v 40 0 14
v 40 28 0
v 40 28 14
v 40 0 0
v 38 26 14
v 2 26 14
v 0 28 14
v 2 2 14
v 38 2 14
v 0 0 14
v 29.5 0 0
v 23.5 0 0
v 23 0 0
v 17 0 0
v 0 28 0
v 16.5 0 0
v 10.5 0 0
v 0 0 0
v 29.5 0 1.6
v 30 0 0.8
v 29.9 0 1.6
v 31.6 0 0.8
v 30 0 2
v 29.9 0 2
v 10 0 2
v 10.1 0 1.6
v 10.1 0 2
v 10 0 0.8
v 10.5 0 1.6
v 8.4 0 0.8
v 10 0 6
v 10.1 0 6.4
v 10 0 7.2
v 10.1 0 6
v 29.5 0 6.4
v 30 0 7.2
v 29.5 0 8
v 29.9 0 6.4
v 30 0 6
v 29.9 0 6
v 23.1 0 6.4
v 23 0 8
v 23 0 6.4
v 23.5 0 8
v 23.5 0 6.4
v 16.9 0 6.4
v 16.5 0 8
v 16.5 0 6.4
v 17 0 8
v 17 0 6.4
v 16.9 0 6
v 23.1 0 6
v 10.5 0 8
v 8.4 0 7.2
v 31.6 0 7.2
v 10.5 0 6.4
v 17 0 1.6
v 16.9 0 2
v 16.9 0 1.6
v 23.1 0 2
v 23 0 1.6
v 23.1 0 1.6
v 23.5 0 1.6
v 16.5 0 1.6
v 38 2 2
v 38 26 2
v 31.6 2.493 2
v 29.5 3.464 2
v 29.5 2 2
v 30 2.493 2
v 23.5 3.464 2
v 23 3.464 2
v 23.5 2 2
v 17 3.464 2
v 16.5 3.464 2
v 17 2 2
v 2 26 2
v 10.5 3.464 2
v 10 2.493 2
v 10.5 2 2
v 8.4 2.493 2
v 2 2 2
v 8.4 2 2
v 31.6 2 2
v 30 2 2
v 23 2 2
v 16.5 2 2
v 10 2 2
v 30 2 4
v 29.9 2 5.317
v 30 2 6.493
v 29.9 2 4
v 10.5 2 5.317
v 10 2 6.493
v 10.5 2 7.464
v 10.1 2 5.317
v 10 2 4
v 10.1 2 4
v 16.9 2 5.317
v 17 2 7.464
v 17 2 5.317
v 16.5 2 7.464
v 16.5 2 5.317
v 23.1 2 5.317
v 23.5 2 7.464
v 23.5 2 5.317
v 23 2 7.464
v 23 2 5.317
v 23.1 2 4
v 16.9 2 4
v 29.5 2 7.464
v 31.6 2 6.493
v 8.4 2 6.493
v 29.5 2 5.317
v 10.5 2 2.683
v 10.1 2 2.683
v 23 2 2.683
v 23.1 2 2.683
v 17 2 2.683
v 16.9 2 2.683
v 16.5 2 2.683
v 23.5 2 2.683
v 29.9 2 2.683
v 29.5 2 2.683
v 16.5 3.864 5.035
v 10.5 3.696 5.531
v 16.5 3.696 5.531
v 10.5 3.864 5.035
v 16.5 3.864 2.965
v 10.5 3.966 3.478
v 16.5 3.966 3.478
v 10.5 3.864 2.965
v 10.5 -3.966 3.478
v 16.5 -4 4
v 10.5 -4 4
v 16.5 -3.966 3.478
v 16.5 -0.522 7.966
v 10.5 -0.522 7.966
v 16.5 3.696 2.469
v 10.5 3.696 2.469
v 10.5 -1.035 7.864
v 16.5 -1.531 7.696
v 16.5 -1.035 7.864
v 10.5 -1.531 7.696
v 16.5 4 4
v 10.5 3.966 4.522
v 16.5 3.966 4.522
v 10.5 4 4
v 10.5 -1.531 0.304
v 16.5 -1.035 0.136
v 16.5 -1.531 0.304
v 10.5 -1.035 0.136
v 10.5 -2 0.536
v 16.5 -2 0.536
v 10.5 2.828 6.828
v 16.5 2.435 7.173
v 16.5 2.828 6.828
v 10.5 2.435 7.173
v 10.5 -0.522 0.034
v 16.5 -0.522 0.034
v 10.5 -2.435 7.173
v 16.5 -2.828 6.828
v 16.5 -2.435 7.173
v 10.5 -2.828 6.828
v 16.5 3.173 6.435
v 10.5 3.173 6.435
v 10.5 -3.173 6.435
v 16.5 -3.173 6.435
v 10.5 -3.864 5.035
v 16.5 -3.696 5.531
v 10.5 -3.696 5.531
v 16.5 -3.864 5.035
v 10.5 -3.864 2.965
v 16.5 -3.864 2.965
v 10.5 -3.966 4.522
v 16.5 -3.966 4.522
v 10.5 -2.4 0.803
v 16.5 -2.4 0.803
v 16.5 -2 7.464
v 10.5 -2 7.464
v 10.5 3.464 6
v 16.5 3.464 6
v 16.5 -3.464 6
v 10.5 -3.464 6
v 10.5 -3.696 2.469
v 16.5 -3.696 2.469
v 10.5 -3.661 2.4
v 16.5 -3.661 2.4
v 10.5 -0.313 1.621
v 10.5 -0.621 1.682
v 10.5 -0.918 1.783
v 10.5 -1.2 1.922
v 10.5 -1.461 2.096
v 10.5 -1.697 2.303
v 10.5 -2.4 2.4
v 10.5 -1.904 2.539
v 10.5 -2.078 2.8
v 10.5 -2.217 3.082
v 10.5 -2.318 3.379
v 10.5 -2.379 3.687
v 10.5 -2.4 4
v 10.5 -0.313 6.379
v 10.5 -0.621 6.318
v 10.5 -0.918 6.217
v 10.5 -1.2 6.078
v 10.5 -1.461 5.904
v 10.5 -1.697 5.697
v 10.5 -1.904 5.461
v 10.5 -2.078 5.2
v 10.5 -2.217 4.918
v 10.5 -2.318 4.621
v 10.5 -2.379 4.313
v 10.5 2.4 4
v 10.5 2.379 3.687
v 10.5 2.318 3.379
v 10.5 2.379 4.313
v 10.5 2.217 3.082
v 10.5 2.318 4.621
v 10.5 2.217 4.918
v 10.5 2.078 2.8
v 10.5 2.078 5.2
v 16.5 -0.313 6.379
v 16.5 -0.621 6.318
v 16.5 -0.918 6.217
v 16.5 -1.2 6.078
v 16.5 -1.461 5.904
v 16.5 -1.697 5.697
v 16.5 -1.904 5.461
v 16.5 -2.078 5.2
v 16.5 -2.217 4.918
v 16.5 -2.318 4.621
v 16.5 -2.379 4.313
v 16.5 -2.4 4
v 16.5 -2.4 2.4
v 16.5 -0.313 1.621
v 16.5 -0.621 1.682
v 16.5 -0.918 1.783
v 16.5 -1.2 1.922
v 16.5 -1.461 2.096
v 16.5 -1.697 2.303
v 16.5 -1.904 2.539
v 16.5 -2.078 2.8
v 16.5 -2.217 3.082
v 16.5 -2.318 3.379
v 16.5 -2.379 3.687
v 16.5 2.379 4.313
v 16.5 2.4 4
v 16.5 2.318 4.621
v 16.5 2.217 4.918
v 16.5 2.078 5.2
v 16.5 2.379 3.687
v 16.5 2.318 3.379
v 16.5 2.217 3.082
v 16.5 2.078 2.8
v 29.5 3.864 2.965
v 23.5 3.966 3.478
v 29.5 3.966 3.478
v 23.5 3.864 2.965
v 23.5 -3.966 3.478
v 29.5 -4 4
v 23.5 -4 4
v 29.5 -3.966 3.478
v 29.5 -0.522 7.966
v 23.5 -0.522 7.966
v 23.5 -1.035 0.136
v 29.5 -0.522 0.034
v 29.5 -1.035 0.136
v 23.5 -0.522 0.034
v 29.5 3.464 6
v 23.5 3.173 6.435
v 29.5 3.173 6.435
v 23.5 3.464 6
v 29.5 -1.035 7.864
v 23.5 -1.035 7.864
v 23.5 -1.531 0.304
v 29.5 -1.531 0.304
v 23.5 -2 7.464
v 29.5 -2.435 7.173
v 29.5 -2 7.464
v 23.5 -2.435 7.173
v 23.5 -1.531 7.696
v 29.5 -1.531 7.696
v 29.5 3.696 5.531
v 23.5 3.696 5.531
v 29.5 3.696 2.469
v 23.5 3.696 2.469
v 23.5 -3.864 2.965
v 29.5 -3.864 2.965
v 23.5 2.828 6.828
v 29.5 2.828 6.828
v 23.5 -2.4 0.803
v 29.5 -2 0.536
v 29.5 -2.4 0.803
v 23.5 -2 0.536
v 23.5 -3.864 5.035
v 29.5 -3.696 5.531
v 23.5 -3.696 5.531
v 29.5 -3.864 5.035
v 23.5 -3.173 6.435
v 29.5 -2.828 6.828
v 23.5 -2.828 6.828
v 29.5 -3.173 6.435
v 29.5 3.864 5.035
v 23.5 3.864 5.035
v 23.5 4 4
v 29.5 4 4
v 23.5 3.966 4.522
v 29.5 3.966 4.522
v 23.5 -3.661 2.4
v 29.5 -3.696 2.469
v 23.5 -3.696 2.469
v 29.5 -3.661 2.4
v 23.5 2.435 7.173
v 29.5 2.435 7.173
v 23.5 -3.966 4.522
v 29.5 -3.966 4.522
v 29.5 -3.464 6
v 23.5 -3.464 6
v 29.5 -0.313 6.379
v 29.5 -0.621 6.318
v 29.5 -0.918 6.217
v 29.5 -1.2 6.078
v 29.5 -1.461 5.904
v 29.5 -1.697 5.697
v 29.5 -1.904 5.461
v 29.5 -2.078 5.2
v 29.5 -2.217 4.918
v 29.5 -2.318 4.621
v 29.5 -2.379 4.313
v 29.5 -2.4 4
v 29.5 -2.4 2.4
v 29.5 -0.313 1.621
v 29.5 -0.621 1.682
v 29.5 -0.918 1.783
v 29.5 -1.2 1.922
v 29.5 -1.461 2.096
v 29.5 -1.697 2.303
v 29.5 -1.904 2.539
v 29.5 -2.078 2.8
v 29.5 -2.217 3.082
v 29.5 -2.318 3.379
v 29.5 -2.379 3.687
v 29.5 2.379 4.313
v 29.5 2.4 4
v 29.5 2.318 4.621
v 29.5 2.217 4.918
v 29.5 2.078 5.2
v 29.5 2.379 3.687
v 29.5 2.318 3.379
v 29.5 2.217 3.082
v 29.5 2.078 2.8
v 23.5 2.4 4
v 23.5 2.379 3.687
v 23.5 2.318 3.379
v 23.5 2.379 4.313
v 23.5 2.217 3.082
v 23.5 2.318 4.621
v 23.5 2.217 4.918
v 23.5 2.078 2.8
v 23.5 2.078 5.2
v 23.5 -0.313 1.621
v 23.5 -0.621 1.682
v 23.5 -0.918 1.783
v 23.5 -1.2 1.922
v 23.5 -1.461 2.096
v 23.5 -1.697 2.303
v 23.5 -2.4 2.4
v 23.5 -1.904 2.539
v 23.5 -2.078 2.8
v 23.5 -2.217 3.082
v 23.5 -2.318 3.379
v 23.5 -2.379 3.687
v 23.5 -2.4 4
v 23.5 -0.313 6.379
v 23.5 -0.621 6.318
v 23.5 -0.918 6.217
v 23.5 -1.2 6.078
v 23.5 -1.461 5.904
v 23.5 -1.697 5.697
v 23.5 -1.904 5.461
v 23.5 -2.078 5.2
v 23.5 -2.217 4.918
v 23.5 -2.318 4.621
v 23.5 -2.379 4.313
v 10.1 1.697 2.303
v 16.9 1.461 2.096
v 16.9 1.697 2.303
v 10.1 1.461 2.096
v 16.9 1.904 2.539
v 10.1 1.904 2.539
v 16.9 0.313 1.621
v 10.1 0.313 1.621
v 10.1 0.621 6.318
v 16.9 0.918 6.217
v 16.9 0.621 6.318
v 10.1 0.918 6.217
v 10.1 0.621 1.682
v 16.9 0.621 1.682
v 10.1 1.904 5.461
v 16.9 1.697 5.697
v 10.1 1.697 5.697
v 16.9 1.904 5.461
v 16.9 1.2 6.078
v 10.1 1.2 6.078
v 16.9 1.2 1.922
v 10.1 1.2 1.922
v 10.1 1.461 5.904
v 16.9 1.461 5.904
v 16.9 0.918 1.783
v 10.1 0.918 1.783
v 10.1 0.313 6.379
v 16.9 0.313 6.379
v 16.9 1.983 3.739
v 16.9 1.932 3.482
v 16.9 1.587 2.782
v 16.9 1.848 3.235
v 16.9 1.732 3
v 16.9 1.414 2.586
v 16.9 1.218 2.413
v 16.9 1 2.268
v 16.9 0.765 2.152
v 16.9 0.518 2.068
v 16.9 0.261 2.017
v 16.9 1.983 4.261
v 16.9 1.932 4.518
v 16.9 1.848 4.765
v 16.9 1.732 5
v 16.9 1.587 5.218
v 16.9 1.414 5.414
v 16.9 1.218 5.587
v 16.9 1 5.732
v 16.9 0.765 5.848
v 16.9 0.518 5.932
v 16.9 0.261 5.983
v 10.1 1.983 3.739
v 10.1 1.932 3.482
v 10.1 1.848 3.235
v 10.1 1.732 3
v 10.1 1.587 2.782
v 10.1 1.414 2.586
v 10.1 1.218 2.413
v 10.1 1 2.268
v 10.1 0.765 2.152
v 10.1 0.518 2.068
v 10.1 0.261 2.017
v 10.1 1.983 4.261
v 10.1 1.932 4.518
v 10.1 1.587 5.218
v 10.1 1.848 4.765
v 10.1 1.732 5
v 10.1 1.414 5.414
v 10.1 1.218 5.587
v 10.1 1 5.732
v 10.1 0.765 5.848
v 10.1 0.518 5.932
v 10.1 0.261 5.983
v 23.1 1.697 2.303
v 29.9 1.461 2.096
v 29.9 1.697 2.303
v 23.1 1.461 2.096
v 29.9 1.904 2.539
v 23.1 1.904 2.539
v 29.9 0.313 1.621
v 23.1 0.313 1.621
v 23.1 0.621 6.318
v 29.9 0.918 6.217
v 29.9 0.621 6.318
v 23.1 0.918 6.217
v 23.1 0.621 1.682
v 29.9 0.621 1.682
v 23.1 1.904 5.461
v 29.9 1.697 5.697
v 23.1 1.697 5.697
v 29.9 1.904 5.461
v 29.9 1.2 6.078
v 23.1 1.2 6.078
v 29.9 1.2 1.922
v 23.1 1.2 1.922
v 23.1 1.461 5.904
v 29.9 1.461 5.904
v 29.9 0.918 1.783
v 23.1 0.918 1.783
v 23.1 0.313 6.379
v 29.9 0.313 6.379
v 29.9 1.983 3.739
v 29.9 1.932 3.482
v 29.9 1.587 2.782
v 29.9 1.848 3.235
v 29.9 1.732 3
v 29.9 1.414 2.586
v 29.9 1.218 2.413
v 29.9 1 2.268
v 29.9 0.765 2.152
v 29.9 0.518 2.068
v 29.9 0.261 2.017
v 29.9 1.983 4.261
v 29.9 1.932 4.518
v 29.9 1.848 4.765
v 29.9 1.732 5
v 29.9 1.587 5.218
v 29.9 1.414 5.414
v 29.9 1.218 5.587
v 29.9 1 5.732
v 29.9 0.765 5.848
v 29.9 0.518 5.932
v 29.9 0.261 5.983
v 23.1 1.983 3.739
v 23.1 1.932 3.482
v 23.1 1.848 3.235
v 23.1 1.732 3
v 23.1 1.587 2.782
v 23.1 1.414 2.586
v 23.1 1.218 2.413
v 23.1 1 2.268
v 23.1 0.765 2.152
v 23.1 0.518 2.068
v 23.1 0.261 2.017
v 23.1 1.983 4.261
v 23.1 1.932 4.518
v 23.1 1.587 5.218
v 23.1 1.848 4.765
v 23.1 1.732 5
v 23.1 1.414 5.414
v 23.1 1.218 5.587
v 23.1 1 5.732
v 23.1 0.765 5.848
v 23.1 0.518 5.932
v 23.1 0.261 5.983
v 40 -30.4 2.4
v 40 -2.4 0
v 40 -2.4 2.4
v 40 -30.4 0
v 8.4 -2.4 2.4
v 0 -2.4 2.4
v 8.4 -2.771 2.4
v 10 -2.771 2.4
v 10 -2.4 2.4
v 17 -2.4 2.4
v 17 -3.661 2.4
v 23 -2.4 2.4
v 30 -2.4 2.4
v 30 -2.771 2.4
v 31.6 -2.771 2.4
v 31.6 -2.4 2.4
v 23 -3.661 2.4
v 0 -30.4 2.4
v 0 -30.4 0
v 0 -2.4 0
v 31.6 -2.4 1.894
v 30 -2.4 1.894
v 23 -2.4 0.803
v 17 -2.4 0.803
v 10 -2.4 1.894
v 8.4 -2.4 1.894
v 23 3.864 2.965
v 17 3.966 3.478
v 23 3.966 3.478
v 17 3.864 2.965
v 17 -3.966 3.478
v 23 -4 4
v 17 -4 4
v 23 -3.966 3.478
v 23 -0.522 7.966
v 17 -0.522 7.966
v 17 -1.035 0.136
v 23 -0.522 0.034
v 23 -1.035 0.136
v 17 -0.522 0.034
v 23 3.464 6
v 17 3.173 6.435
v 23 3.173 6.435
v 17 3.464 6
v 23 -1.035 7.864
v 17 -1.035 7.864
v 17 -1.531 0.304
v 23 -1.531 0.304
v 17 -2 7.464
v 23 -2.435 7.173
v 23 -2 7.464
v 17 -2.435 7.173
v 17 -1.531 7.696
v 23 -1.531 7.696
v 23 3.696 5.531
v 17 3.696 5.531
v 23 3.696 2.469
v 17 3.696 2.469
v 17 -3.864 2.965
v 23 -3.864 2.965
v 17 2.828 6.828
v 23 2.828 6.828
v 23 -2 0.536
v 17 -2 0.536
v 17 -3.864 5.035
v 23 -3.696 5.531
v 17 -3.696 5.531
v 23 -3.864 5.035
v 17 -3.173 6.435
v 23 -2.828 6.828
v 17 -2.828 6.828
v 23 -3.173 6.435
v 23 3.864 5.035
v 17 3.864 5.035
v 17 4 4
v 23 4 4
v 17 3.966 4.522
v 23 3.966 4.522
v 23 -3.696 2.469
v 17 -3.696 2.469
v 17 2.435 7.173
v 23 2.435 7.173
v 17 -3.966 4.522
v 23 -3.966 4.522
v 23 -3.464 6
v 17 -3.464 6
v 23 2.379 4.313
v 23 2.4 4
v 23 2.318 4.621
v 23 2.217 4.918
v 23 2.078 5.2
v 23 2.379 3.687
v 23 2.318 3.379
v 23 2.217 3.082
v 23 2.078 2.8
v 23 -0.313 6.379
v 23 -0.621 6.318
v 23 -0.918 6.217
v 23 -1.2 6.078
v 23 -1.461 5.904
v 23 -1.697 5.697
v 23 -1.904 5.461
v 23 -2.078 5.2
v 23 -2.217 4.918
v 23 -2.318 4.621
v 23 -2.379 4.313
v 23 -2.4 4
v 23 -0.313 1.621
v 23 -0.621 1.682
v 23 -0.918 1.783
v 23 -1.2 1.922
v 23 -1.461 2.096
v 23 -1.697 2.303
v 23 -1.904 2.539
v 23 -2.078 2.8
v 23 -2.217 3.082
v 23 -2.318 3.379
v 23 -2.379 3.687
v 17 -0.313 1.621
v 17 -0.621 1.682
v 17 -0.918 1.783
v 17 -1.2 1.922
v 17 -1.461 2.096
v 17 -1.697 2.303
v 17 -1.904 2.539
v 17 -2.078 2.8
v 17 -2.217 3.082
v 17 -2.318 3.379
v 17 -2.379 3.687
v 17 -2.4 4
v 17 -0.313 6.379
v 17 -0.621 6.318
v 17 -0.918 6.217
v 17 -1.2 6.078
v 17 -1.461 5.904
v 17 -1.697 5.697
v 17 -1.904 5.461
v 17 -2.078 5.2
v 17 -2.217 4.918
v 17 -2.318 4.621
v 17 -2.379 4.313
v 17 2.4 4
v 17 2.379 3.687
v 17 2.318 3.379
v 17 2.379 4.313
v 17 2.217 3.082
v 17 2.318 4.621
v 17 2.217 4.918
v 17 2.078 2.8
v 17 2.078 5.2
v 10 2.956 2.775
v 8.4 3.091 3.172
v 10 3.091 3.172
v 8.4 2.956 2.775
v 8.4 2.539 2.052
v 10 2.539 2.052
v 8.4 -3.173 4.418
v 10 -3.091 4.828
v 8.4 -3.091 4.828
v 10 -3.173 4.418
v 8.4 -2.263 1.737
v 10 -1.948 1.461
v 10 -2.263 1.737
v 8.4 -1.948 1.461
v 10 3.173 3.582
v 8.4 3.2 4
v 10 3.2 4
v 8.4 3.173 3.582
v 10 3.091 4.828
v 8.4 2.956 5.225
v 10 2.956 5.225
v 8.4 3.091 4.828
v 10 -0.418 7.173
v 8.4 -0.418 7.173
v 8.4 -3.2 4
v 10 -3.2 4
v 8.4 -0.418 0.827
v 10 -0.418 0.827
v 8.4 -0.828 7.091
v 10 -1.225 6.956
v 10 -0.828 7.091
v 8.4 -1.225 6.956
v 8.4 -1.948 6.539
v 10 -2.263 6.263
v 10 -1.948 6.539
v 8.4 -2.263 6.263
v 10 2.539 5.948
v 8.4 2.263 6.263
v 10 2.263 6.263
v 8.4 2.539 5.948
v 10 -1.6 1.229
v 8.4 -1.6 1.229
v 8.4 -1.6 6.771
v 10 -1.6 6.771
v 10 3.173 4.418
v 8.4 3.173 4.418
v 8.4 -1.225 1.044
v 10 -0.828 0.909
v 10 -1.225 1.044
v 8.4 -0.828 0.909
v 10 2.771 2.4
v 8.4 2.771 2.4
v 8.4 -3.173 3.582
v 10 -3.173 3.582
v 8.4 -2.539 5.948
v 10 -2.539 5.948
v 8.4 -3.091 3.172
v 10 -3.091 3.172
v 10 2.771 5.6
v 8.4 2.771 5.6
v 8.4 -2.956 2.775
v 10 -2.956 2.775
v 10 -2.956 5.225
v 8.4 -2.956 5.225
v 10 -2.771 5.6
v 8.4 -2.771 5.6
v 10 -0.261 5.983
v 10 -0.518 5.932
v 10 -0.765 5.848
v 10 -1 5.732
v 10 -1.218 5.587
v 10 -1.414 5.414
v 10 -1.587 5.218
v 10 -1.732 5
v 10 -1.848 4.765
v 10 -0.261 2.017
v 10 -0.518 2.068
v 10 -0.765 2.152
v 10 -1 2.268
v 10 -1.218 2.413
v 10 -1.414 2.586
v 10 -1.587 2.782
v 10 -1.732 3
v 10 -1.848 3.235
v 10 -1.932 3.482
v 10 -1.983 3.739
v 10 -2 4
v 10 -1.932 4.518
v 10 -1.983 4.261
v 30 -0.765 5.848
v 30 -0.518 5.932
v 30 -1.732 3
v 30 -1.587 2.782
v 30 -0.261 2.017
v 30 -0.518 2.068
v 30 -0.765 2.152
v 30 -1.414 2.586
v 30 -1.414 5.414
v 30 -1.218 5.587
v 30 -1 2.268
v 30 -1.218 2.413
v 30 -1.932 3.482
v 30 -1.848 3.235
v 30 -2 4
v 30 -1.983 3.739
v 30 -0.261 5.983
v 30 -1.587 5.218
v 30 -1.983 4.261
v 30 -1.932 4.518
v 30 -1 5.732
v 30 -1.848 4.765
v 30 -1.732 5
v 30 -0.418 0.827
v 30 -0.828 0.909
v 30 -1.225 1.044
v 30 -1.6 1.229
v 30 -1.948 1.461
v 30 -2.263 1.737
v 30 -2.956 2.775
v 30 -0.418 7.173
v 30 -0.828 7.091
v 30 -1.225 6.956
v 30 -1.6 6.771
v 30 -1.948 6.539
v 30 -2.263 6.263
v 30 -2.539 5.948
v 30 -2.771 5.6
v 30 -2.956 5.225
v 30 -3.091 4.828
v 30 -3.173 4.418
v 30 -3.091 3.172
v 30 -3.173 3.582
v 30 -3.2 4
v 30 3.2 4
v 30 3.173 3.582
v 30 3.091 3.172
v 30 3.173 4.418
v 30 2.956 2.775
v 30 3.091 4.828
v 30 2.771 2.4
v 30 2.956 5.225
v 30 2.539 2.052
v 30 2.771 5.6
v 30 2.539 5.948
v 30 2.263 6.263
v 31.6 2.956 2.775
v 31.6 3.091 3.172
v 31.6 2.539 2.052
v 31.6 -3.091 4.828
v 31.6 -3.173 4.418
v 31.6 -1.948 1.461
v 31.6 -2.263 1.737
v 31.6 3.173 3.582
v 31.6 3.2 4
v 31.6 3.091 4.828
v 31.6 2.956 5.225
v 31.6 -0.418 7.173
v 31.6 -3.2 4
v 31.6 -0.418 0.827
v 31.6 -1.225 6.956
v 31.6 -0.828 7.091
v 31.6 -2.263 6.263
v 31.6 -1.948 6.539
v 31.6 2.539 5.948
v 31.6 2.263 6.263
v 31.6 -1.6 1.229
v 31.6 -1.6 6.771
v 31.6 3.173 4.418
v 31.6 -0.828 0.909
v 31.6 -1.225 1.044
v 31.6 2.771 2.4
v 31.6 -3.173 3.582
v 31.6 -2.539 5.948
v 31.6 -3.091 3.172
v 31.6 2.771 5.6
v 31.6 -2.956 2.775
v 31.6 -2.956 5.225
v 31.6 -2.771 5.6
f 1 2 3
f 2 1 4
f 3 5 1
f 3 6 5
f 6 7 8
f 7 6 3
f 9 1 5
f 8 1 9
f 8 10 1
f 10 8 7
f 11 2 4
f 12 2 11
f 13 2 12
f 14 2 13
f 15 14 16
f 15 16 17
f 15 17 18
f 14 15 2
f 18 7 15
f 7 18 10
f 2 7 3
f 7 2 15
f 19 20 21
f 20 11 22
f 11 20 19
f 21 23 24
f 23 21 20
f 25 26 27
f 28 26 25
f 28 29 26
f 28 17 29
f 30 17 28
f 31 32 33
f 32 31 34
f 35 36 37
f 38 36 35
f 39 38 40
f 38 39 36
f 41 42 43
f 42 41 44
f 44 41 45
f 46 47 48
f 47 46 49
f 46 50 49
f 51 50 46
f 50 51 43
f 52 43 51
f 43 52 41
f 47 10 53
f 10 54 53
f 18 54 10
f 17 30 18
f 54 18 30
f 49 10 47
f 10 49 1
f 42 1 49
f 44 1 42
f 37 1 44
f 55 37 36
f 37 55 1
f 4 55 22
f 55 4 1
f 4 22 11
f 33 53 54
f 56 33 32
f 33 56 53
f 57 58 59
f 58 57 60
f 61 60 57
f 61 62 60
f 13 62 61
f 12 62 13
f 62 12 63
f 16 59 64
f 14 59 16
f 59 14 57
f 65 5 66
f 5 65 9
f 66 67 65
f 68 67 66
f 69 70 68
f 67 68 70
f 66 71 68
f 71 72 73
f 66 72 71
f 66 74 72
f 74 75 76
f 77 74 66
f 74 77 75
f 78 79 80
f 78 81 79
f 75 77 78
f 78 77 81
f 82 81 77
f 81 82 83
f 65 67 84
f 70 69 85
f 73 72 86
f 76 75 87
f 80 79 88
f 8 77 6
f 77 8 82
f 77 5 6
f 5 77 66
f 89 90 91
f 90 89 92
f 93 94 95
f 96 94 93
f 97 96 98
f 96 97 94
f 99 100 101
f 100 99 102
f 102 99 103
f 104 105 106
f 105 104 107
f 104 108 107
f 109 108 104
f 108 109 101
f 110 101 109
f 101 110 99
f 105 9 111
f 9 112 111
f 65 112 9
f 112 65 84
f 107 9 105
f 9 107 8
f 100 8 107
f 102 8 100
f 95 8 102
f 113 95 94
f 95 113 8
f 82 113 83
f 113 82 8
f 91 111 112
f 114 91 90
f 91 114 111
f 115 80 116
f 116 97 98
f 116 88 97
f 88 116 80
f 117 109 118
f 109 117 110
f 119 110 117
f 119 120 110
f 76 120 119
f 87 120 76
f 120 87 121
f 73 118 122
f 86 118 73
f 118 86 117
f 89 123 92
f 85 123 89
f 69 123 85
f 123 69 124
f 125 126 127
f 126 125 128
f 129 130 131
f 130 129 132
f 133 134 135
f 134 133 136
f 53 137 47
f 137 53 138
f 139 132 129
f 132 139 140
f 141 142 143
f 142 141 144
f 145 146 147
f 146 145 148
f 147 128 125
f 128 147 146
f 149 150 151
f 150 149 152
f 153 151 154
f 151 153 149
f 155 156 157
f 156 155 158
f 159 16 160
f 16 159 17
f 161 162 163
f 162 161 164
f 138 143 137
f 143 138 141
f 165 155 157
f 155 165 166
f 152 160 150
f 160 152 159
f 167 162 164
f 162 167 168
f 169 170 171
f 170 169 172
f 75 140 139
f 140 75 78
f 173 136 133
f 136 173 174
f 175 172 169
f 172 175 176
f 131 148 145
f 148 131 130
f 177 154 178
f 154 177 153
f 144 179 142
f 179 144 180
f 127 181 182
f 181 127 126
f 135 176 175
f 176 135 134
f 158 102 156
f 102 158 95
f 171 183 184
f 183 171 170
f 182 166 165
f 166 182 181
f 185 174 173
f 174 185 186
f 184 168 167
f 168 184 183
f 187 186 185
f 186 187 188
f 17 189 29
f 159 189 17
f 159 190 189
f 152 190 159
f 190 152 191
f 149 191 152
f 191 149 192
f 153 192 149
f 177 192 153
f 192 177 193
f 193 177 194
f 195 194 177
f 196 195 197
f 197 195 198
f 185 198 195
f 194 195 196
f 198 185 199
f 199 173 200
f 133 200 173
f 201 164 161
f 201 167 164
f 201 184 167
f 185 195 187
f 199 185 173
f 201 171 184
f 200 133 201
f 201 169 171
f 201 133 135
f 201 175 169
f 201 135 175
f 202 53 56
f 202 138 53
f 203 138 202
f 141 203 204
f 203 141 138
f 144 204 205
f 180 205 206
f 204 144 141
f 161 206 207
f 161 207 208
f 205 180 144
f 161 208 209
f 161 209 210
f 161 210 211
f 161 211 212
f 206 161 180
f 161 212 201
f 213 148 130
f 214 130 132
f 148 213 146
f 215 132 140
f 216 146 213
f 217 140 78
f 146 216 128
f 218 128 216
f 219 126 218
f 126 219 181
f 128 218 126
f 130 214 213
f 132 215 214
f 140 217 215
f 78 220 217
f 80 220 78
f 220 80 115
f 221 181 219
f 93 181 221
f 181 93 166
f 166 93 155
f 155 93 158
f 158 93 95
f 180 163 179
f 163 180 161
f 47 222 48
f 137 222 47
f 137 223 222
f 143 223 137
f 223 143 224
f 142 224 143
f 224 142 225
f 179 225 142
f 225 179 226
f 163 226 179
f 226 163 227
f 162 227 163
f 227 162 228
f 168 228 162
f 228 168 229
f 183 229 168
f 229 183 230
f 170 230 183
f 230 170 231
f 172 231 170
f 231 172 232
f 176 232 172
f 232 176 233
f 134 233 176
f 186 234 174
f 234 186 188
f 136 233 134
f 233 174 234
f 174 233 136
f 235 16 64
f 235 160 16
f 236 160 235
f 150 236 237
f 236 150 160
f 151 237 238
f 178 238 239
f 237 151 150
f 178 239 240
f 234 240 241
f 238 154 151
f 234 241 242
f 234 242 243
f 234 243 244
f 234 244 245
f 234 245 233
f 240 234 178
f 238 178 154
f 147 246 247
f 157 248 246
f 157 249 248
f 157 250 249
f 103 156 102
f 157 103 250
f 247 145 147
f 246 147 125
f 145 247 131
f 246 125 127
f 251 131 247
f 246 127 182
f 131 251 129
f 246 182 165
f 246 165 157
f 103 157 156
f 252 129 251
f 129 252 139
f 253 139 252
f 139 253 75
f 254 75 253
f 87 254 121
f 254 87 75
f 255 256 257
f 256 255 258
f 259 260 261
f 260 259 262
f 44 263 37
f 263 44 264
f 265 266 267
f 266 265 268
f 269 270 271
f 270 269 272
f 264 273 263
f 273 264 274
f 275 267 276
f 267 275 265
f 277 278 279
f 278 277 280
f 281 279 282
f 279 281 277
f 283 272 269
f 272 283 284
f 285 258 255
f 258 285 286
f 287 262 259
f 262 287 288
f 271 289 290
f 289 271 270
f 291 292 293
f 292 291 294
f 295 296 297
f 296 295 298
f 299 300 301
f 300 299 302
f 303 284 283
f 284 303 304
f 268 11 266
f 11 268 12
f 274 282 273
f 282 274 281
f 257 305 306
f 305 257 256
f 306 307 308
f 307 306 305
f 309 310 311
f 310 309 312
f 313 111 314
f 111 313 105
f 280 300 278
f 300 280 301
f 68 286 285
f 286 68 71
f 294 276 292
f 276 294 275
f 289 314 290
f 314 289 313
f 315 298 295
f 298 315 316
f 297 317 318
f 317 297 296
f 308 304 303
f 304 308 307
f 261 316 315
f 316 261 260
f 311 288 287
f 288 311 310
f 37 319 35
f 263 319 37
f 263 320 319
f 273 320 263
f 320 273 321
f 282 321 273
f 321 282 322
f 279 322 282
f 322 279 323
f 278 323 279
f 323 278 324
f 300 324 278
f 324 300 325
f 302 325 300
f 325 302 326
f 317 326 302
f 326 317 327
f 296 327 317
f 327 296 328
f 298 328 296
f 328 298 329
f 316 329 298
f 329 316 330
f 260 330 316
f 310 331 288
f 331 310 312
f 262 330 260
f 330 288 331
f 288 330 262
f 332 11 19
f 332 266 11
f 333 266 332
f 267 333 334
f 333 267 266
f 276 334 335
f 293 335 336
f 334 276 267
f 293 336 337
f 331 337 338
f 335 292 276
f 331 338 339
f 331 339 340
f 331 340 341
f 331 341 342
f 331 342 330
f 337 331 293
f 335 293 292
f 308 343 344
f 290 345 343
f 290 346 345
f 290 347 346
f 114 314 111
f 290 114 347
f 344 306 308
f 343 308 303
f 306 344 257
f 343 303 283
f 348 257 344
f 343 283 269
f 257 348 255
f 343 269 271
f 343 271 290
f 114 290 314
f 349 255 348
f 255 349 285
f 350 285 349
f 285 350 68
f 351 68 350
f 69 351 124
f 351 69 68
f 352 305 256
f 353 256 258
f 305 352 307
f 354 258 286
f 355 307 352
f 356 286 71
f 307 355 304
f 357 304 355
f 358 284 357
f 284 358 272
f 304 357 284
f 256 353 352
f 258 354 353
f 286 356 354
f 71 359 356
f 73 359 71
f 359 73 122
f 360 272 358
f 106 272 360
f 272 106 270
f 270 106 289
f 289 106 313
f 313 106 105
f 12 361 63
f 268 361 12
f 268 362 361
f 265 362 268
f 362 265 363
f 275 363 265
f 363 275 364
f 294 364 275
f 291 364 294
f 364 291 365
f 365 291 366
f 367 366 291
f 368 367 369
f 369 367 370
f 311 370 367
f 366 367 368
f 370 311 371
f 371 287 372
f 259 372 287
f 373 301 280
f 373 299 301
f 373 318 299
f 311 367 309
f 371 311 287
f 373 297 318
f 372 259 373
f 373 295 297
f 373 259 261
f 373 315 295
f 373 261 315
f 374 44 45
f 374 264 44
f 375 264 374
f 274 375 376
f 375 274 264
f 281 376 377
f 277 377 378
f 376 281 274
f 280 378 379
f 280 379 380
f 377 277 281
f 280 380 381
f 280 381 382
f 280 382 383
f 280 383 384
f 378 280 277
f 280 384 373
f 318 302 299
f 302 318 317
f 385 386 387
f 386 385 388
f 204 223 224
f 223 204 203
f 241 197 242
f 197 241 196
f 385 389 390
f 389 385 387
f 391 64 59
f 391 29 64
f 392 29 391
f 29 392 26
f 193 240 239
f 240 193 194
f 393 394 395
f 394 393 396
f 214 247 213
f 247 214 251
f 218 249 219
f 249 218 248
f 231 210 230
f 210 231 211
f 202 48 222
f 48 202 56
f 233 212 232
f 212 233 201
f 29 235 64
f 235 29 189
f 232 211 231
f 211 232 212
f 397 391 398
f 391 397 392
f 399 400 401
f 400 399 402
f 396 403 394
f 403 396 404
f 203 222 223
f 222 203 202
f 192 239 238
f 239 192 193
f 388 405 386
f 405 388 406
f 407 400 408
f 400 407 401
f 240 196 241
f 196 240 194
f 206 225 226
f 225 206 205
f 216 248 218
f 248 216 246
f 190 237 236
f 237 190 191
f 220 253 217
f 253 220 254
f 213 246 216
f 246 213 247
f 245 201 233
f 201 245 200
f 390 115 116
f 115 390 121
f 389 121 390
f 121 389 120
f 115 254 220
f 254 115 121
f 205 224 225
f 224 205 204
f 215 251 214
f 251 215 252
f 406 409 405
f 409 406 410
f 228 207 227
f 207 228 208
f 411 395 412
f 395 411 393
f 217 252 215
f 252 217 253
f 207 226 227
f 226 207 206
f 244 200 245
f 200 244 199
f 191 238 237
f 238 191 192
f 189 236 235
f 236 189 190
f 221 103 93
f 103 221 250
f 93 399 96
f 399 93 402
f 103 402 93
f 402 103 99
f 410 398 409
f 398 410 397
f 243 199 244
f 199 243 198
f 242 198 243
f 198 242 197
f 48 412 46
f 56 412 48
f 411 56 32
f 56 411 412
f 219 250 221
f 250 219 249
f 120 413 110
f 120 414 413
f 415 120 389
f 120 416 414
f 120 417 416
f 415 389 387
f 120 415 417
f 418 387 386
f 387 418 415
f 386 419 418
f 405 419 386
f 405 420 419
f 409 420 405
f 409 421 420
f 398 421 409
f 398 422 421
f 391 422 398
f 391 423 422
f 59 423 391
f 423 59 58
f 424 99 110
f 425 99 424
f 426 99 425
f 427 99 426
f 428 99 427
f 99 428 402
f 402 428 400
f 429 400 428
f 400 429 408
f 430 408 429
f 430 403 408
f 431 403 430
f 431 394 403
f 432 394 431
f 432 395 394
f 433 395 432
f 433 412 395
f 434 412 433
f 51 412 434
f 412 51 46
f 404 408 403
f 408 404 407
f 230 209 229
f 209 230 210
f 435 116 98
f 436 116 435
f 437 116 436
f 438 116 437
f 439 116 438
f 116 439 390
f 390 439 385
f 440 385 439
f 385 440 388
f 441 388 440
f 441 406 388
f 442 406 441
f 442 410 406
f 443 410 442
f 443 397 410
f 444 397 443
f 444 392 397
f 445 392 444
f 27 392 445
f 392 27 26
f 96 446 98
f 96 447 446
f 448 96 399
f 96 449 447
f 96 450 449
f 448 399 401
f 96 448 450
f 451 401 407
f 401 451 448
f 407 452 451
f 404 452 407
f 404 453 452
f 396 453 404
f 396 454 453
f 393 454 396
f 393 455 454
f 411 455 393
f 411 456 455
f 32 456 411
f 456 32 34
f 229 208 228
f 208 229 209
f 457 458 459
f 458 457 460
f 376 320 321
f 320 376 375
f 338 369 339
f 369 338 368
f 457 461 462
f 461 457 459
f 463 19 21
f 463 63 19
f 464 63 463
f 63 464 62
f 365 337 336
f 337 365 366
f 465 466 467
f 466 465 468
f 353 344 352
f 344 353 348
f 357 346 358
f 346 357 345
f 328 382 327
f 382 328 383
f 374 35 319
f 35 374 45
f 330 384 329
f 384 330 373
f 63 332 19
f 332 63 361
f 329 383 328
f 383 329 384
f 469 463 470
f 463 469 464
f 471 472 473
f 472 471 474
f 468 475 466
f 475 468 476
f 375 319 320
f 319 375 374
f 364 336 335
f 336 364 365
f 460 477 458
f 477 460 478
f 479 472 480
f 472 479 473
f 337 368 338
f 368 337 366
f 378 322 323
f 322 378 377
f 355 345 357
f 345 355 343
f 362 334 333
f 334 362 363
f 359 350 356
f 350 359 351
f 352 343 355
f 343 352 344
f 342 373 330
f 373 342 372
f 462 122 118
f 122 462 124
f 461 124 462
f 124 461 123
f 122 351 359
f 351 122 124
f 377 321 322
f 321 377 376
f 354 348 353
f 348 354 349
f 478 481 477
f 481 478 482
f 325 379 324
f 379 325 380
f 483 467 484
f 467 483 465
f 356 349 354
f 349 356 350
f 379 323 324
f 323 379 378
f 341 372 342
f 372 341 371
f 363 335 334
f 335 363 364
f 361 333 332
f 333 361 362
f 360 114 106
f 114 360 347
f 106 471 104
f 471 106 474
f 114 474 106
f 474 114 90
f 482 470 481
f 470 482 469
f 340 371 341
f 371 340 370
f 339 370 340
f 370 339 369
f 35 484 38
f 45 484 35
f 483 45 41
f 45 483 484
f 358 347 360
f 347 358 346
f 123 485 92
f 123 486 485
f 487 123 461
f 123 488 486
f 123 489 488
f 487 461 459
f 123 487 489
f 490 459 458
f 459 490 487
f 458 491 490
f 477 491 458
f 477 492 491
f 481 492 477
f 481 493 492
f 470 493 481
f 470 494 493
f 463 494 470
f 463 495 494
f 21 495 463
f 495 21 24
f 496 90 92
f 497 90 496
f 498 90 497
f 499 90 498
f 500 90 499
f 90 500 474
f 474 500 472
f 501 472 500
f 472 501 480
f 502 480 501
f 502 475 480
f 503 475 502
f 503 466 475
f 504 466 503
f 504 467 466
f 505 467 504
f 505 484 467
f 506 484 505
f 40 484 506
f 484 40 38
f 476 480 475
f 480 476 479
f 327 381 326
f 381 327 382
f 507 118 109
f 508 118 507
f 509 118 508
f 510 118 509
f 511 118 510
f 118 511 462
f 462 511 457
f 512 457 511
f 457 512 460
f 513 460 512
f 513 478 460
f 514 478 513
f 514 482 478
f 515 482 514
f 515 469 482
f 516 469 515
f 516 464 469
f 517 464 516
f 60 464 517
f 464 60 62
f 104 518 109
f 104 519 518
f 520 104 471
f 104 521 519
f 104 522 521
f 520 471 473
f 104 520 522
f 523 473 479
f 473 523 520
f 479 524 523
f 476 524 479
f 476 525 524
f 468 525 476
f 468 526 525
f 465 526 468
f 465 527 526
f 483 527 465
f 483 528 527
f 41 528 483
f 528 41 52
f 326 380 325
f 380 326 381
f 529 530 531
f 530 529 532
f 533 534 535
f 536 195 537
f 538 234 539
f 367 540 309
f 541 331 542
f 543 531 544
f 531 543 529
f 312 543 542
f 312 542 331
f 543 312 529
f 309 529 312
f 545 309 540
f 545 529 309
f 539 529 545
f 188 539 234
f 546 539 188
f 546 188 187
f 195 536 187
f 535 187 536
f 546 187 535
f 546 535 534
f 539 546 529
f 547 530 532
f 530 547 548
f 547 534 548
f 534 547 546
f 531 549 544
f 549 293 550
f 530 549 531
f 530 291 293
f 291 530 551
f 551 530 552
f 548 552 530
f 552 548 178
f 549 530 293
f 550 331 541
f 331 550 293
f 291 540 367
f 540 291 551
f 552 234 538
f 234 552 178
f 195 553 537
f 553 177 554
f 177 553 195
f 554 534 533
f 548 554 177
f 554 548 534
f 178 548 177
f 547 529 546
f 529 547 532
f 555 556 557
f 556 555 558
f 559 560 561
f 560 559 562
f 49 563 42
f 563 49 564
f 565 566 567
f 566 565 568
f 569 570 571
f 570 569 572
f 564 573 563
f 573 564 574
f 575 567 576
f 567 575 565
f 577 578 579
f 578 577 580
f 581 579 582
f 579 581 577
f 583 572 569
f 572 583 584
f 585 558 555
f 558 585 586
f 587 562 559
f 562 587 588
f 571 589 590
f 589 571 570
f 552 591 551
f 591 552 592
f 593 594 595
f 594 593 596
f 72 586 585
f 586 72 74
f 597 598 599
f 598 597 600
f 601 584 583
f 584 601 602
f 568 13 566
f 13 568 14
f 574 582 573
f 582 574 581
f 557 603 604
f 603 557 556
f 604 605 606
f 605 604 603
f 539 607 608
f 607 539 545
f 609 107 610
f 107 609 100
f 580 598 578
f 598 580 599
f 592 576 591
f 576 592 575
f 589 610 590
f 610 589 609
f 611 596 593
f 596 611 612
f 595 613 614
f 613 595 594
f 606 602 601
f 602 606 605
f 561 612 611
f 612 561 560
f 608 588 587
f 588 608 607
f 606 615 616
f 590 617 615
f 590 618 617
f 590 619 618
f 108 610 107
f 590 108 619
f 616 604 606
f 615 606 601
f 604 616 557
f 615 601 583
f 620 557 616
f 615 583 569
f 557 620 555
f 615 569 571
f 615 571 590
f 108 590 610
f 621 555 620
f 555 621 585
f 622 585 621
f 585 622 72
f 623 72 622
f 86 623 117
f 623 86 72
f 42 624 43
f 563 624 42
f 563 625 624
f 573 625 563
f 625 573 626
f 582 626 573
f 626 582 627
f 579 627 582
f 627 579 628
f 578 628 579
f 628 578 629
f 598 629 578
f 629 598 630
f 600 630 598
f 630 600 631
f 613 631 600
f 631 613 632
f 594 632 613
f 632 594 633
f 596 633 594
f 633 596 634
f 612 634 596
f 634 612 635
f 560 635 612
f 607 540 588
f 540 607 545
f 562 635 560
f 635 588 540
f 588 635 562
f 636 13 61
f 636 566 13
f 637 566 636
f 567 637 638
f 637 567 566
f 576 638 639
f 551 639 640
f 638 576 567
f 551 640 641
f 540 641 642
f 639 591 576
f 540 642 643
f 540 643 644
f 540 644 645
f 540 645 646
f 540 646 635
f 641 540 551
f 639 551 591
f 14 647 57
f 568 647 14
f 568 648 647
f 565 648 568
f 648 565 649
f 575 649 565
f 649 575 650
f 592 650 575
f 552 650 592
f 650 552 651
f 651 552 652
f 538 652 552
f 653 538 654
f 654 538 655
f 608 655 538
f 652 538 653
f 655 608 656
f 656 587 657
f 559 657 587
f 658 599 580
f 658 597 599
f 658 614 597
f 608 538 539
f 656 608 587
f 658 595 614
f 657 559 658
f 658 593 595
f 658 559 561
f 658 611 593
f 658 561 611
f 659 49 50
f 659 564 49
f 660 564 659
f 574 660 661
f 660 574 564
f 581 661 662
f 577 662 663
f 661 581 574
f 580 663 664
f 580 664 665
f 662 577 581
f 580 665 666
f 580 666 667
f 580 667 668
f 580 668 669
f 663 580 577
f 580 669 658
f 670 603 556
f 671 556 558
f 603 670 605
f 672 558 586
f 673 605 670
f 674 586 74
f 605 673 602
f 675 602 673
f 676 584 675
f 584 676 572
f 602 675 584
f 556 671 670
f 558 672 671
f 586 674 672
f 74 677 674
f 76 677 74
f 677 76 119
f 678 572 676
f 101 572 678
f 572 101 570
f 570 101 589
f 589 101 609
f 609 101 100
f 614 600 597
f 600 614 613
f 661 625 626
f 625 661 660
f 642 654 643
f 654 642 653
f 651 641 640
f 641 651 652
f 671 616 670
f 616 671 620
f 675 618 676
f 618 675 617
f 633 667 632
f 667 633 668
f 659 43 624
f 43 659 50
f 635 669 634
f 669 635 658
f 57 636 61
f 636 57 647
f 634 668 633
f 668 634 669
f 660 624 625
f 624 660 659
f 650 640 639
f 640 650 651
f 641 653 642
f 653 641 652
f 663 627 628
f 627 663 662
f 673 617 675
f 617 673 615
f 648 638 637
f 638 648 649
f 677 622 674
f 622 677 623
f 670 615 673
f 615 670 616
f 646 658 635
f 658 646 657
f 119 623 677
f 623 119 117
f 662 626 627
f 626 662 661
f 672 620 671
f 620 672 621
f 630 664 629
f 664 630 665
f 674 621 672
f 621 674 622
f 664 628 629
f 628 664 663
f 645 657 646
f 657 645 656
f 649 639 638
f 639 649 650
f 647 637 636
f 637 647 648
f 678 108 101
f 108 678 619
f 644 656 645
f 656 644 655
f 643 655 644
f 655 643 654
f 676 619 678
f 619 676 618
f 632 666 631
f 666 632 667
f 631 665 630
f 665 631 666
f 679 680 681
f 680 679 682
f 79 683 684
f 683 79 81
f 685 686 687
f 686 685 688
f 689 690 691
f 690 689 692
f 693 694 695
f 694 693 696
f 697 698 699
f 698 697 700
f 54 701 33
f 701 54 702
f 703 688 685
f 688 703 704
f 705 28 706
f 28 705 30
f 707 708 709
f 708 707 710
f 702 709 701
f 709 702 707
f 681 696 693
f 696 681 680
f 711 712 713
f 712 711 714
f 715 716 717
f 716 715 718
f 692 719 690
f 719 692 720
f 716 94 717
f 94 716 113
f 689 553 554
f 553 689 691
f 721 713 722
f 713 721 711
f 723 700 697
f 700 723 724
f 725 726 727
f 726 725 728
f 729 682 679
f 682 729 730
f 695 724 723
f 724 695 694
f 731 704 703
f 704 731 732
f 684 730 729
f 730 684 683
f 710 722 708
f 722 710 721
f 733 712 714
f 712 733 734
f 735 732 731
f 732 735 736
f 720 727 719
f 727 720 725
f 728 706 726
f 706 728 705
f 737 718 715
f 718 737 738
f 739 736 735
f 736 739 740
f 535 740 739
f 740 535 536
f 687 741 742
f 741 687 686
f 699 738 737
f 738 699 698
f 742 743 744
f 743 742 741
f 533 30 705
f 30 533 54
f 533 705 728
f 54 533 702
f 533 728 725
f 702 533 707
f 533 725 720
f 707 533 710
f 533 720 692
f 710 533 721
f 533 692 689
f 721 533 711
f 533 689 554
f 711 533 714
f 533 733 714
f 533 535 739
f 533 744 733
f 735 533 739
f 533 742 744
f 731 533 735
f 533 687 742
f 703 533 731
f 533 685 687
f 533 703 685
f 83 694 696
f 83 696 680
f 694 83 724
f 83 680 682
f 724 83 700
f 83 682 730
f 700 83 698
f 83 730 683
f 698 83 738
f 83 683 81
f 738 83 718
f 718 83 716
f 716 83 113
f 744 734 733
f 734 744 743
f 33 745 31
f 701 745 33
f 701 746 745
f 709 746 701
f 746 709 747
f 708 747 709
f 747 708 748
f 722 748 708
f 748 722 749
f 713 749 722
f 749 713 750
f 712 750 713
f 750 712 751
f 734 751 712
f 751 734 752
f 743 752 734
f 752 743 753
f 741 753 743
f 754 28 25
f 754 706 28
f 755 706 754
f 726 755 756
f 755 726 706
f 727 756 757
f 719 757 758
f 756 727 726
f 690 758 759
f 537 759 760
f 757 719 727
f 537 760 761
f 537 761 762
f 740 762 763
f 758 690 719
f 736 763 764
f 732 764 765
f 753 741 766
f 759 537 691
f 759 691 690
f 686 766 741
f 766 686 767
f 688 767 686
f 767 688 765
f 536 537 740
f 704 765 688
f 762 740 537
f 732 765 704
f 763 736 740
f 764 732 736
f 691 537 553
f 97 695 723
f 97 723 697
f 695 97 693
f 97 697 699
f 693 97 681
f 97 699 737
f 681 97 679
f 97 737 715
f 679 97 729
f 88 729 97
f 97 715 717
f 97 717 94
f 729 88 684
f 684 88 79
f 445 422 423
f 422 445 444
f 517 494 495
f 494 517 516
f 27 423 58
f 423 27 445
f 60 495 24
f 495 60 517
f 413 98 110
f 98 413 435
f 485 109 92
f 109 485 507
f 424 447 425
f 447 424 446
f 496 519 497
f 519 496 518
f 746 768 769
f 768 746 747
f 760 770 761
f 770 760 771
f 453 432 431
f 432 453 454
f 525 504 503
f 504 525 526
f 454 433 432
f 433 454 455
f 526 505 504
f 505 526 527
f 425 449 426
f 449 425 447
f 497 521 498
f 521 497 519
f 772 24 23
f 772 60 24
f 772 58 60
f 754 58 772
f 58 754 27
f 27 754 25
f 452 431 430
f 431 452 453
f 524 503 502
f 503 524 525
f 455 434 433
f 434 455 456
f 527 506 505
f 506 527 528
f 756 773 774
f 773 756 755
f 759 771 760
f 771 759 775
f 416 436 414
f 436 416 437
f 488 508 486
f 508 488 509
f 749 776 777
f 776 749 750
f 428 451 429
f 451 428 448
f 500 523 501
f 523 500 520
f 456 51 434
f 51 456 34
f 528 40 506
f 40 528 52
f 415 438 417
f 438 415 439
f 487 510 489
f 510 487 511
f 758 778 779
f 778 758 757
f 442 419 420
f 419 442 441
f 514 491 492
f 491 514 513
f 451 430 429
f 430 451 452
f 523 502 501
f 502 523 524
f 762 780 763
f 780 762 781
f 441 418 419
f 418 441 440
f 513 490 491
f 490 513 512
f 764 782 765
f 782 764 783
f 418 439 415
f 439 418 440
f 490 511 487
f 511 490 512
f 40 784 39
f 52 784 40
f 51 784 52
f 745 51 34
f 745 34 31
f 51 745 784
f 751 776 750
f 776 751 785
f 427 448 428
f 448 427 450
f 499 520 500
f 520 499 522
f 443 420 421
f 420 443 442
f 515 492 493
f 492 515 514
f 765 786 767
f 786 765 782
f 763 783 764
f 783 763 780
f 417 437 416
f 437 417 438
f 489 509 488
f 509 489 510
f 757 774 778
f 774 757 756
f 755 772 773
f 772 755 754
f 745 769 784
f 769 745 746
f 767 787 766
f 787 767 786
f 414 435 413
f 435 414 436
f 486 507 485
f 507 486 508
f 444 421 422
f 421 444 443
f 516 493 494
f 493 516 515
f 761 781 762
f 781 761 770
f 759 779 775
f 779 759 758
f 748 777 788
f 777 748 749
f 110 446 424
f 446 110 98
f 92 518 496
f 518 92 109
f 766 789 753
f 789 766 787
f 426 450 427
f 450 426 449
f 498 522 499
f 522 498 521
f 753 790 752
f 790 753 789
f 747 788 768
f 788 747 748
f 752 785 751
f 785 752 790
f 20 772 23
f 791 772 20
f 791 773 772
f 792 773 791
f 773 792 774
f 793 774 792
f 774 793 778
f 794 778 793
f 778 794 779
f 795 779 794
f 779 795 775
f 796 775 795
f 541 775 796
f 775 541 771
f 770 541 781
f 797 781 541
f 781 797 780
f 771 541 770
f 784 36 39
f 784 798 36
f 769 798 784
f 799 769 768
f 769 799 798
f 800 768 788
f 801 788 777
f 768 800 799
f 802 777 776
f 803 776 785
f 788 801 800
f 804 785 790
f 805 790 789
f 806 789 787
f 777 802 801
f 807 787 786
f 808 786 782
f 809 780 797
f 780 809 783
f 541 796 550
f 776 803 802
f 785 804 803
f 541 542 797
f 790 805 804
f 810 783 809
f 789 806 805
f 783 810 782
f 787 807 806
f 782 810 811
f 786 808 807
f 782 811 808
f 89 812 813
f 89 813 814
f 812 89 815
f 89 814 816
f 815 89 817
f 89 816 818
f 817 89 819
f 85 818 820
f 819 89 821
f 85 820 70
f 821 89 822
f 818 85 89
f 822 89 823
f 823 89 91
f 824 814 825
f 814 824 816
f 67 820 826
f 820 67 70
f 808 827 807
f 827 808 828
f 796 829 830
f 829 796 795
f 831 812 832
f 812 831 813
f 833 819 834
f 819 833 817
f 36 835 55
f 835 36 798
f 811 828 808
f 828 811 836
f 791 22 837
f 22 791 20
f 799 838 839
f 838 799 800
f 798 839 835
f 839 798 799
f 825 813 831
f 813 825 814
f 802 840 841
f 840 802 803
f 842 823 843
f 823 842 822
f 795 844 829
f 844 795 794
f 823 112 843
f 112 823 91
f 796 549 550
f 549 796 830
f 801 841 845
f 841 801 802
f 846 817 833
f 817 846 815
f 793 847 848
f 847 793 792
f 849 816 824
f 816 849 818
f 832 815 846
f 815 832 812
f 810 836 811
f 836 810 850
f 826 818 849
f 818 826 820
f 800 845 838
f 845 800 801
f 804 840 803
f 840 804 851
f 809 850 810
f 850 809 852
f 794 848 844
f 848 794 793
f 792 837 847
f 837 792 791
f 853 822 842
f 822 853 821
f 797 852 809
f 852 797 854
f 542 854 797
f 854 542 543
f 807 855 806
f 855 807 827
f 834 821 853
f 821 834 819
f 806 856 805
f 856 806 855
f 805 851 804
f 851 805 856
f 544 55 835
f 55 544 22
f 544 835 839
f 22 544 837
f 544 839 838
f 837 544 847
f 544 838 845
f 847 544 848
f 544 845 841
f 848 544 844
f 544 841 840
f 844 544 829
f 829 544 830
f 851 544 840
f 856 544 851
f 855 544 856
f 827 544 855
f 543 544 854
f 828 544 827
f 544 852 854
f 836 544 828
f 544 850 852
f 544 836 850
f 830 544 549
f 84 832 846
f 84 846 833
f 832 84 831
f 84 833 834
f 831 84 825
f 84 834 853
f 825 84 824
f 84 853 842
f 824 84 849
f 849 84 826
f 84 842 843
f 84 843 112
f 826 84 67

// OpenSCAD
// Fixture: print-in-place hinged box lid (mm)
// Target: Bambu Lab P2S, 0.4 mm nozzle
// hinge / print-in-place
// radial_mm = 0.4  (bore_d = pin_d + 0.8)
// axial_mm = 0.5   min_pin_mm = 4
$fn = 48;
radial_mm = 0.4;
axial_mm = 0.5;
pin_d = 4;
bore_d = 4.8;
knuckle_od = 8;
knuckle_len = 6;
axis_y = 0;
axis_z = 4;
box_w = 40;
box_d = 28;
box_h = 14;
wall = 2;
lid_t = 2.4;
lid_y0 = -30.4;

module knuckle(x0) {
  translate([x0, axis_y, axis_z])
    rotate([0, 90, 0])
      cylinder(h = knuckle_len, d = knuckle_od);
}

module bore_cut(x0) {
  translate([x0 - 0.4, axis_y, axis_z])
    rotate([0, 90, 0])
      cylinder(h = knuckle_len + 0.8, d = bore_d);
}

module box_body() {
  difference() {
    union() {
      difference() {
        cube([box_w, box_d, box_h]);
        translate([wall, wall, wall])
          cube([box_w - wall * 2, box_d - wall * 2, box_h]);
      }
      knuckle(10.5);
      knuckle(23.5);
    }
    bore_cut(10.5);
    bore_cut(23.5);
  }
}

module lid() {
  difference() {
    union() {
      translate([0, lid_y0, 0])
        cube([box_w, box_d, lid_t]);
      knuckle(17);
    }
    bore_cut(17);
  }
}

module hinge_pin() {
  head_d = pin_d + 2.4;
  head_h = 1.6;
  translate([10 - head_h, axis_y, axis_z])
    rotate([0, 90, 0]) {
      cylinder(h = head_h, d = head_d);
      translate([0, 0, head_h])
        cylinder(h = 20, d = pin_d);
      translate([0, 0, head_h + 20])
        cylinder(h = head_h, d = head_d);
    }
}

// Separate solids — do not union. Print-in-place clearances are the gaps.
box_body();
lid();
hinge_pin();
